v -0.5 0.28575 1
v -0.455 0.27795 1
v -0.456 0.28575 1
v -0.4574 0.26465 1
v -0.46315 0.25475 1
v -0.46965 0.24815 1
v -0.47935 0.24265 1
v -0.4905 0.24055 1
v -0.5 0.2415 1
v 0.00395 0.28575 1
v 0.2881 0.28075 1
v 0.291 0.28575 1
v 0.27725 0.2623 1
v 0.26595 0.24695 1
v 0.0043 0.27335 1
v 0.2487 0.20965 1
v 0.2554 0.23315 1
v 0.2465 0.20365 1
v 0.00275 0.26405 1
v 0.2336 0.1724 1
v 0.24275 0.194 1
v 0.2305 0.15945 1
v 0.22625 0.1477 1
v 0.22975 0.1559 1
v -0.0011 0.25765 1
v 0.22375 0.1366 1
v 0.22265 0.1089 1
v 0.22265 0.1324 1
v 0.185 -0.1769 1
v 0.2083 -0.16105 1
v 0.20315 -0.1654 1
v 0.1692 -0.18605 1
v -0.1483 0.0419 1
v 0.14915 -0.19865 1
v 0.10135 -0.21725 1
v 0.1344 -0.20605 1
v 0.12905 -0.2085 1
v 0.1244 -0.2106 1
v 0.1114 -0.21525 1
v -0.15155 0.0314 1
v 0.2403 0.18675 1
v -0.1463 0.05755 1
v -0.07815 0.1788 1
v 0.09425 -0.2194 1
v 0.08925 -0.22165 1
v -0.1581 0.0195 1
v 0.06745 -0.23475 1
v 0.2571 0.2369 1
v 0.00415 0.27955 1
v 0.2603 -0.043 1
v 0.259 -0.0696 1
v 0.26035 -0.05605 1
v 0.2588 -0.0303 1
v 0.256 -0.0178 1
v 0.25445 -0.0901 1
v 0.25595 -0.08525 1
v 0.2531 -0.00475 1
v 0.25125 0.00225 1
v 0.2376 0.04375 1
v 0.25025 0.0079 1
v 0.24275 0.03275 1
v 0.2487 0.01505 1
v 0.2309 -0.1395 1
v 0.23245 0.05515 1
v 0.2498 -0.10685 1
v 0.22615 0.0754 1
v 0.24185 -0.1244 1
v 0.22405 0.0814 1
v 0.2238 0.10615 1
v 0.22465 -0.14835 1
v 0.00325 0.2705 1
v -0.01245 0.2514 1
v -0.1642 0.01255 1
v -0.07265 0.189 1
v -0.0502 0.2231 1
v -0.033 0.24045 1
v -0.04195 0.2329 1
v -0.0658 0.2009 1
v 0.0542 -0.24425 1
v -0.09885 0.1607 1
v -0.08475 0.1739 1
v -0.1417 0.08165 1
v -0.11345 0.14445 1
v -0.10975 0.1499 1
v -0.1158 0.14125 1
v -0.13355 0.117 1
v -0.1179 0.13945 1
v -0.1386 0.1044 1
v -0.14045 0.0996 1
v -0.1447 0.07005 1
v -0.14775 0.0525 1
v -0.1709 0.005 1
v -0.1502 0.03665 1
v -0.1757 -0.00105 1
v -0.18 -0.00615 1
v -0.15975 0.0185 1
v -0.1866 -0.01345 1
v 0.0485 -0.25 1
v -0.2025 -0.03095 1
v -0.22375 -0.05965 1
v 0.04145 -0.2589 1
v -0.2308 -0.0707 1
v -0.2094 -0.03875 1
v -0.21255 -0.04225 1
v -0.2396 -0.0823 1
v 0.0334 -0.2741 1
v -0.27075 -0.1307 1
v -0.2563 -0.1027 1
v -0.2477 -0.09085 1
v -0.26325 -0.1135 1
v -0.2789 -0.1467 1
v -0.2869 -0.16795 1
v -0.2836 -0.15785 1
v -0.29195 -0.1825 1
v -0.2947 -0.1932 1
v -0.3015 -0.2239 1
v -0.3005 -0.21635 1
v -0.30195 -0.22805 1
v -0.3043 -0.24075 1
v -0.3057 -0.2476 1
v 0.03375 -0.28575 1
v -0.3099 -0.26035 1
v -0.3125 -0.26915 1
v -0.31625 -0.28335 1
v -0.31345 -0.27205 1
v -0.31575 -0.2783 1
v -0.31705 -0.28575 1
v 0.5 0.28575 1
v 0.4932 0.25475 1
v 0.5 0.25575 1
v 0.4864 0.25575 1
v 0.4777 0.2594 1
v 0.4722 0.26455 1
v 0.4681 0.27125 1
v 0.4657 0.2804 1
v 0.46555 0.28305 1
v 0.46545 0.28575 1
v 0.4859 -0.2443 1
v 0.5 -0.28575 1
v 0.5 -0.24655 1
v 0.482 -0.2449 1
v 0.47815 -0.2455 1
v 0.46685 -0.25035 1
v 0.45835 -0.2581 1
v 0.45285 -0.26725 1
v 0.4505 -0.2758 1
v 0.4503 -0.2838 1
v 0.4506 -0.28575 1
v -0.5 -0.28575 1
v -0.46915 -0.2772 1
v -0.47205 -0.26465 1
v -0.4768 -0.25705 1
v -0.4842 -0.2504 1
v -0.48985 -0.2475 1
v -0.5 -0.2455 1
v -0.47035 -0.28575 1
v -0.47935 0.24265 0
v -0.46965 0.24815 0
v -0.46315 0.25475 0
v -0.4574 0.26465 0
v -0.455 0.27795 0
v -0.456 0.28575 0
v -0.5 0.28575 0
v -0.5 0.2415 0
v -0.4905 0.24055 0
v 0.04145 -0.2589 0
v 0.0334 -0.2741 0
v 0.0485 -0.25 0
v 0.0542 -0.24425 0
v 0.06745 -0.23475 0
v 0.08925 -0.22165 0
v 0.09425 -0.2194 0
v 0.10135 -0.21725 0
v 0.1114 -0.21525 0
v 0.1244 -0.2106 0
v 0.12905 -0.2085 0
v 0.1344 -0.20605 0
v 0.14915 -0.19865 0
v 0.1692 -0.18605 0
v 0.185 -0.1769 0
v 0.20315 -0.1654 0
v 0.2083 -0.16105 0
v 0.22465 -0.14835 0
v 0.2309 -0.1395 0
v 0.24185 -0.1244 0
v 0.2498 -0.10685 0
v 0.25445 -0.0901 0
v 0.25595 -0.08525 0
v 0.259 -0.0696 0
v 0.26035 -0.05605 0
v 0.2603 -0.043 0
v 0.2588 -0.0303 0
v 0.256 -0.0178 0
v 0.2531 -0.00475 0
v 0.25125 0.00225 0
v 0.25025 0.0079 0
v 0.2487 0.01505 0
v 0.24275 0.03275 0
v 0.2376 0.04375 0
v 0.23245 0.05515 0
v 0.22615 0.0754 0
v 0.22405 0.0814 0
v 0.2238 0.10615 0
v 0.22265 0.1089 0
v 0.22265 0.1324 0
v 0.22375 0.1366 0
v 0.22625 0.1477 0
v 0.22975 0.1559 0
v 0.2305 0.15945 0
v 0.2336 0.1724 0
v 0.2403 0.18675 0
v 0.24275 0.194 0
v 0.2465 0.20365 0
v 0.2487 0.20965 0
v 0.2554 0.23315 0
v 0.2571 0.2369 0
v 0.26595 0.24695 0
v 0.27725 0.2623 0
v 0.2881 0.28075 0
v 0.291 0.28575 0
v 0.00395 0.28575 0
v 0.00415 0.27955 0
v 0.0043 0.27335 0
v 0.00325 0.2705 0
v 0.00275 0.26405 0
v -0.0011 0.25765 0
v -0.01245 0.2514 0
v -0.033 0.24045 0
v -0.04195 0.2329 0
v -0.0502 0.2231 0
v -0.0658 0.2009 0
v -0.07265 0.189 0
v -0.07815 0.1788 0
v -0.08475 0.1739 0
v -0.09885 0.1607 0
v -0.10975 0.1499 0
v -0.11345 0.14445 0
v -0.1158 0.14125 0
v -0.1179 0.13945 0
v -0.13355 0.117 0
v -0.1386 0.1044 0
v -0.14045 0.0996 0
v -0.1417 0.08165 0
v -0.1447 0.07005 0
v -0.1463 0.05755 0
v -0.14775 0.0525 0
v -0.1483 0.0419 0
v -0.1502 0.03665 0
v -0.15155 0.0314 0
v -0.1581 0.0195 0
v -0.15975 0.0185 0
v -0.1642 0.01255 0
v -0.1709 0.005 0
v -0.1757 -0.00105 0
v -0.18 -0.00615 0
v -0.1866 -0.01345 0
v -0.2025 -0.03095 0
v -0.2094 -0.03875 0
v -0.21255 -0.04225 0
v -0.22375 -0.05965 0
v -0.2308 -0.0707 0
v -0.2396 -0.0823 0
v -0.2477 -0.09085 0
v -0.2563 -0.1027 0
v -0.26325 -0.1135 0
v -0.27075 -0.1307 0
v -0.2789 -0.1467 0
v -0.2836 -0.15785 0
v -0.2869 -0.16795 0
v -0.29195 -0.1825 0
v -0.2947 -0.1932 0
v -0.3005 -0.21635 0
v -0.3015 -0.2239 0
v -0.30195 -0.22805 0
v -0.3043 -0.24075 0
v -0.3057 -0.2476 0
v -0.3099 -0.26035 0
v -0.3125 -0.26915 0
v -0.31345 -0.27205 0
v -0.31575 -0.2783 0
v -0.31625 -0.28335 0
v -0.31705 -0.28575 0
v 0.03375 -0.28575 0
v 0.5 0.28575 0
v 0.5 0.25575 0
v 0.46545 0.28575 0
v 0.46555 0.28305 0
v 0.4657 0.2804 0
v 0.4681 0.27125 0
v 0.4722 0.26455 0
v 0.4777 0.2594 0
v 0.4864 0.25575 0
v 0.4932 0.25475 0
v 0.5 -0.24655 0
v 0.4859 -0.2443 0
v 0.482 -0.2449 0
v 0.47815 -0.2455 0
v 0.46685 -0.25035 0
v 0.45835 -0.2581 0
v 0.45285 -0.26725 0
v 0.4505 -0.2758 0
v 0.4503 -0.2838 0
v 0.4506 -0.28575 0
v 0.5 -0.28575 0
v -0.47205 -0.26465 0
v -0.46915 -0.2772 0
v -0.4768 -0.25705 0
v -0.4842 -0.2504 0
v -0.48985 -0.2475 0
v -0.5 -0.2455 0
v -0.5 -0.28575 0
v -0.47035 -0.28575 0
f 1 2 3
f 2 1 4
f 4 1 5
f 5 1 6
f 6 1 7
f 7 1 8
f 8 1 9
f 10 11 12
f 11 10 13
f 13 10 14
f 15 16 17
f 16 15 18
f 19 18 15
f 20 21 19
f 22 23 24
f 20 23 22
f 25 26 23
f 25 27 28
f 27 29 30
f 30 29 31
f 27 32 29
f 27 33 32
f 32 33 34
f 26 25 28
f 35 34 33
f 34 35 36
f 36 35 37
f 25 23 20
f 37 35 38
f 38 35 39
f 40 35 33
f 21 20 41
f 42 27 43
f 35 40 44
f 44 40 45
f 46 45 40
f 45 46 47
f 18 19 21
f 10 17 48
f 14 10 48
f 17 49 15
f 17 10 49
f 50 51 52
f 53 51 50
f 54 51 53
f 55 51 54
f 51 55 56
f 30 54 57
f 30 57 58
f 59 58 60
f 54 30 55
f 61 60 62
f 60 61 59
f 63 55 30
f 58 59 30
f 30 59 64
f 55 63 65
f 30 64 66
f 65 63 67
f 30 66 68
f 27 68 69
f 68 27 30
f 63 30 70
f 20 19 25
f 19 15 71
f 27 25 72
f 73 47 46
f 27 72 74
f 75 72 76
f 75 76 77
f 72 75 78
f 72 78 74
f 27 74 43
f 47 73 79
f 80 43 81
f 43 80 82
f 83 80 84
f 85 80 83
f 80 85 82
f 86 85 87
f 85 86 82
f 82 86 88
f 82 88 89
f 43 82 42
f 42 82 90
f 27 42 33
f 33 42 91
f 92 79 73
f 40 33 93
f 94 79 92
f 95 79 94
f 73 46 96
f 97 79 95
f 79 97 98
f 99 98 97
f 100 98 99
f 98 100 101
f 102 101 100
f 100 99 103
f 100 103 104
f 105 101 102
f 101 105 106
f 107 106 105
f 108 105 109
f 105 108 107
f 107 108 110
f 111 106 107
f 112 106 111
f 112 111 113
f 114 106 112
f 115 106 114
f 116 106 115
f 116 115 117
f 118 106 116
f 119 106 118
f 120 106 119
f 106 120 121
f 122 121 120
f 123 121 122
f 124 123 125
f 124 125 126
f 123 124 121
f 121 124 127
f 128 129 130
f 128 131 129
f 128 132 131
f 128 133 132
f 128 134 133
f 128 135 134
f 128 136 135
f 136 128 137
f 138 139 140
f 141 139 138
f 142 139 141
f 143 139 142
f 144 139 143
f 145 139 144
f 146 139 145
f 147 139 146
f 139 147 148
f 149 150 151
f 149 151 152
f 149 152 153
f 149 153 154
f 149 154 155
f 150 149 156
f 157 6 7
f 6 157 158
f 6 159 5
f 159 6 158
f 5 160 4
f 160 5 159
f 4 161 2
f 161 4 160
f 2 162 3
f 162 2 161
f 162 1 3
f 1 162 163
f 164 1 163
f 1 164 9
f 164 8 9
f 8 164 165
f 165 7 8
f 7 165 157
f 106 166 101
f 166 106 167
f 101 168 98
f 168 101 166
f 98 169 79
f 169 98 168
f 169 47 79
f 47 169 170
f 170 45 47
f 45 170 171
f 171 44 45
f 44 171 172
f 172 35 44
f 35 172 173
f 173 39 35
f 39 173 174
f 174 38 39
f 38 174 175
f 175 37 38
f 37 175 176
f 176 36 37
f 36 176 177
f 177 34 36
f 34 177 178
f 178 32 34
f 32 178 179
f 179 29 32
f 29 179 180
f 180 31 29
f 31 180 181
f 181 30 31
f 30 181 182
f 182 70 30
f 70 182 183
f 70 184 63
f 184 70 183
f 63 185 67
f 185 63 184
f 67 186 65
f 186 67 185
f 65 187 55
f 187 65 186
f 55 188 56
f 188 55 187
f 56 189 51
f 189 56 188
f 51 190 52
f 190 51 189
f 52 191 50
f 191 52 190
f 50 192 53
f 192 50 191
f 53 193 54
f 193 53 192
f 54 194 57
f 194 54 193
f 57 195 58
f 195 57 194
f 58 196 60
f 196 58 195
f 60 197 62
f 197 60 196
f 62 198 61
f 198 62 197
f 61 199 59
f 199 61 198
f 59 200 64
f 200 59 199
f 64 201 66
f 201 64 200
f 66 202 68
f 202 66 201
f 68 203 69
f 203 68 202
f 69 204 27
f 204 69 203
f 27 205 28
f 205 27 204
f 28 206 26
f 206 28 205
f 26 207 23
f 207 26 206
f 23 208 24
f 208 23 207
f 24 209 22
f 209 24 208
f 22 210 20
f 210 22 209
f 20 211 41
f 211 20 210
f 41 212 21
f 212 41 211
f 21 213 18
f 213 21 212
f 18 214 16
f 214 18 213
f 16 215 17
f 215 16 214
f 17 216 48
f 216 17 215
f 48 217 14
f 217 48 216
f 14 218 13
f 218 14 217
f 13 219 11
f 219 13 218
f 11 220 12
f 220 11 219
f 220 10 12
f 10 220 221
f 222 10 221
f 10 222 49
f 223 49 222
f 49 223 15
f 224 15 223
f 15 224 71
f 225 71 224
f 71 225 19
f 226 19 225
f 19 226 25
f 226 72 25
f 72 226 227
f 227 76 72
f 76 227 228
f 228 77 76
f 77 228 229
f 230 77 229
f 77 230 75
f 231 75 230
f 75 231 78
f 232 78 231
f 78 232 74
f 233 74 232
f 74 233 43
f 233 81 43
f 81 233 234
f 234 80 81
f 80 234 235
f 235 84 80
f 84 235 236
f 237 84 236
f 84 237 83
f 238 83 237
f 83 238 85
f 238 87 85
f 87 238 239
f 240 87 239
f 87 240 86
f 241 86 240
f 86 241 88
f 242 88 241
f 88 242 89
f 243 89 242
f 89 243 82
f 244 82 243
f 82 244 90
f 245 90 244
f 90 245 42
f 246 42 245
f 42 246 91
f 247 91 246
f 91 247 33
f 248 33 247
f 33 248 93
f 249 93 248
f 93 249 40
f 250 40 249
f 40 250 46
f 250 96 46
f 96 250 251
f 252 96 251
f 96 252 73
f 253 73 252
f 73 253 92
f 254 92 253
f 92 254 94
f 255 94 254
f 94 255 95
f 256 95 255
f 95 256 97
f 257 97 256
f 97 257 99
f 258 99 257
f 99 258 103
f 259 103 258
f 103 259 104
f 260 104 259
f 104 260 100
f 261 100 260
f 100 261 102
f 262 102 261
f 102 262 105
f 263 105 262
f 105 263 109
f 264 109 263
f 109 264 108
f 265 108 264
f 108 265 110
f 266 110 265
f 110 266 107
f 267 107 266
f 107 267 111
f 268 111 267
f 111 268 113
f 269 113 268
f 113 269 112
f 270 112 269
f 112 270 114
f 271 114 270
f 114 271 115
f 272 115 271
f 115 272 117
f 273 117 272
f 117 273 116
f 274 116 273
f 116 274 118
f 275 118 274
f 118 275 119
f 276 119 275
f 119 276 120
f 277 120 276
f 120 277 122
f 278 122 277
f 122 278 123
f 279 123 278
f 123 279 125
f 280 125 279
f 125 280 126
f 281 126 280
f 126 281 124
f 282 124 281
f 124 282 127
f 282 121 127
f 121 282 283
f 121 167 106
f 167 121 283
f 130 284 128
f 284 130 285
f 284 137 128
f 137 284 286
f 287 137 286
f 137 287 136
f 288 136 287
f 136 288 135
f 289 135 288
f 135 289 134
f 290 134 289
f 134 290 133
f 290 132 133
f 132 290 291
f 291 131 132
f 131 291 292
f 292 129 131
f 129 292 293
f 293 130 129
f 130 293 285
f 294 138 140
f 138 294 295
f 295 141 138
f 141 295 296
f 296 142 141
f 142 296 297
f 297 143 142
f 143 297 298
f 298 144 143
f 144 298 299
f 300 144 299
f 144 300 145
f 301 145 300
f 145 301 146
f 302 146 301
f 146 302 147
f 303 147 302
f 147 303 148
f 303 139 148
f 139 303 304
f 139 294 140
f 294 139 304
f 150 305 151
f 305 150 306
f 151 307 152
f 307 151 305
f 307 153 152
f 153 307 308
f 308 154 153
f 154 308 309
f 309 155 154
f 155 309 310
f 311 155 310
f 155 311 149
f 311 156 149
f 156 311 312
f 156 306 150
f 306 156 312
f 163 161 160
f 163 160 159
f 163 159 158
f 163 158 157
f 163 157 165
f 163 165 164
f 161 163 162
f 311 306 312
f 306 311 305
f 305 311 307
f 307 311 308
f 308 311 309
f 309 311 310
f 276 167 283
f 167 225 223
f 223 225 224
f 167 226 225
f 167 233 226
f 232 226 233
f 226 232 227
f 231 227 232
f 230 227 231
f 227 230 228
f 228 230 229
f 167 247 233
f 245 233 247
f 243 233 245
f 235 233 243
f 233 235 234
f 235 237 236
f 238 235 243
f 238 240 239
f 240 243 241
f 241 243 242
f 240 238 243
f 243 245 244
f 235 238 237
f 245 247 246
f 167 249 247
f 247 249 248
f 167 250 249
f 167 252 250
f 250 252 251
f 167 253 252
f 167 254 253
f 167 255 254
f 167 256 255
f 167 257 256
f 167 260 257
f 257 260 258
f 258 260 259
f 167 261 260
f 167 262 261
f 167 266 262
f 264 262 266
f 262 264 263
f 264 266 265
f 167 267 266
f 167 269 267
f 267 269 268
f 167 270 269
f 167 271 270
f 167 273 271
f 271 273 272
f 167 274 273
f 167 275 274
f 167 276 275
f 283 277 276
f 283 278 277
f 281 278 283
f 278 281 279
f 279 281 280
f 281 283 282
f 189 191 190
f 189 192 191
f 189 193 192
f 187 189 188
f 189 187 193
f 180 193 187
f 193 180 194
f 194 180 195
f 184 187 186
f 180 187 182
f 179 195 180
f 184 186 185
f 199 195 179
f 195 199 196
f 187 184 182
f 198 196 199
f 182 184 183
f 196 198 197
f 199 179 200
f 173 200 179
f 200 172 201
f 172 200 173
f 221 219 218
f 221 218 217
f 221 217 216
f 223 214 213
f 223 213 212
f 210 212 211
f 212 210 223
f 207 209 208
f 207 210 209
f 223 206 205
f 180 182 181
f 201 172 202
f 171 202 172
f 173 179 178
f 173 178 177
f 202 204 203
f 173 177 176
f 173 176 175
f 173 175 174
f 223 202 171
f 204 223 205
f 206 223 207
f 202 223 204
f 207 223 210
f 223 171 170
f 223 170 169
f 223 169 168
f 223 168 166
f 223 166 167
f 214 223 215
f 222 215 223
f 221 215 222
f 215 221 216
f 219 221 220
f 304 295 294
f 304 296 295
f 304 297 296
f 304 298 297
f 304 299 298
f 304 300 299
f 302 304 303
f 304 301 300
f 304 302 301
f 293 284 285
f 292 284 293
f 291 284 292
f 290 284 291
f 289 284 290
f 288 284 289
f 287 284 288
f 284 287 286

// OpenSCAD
module card4orange_1()
{
 /* Generated by trace2scad version 20150415
    http://aggregate.org/MAKE/TRACE2SCAD/
    Optimized model has 158/1051 original points
 */
 color([0.5, 0.5, 0.5])
 assign(minx=0) /* polygon minx=0 */
 assign(miny=0) /* polygon miny=0 */
 assign(maxx=20000) /* polygon maxx=20000 */
 assign(maxy=11430) /* polygon maxy=11430 */
 assign(dx=maxx-minx)
 assign(dy=maxy-miny)
 assign(maxd=((dx>dy)?dx:dy))
 scale([1/maxd, 1/maxd, 1])
 translate([-minx-dx/2, -miny-dy/2, 0])
 linear_extrude(height=1, convexity=158)
 union() {
  union() {
   polygon([[0,10988],[0,10545],[190,10526],[413,10568],[607,10678],[737,10810],[852,11008],[900,11274],[880,11430],[0,11430]], convexity=5);
   polygon([[10083,11306],[10086,11182],[10065,11125],[10055,10996],[9978,10868],[9751,10743],[9340,10524],[9161,10373],[8996,10177],[8684,9733],[8547,9495],[8437,9291],[8305,9193],[8023,8929],[7805,8713],[7731,8604],[7684,8540],[7642,8504],[7329,8055],[7228,7803],[7191,7707],[7166,7348],[7106,7116],[7074,6866],[7045,6765],[7034,6553],[6996,6448],[6969,6343],[6838,6105],[6805,6085],[6716,5966],[6582,5815],[6486,5694],[6400,5592],[6268,5446],[5950,5096],[5812,4940],[5749,4870],[5525,4522],[5384,4301],[5208,4069],[5046,3898],[4874,3661],[4735,3445],[4585,3101],[4422,2781],[4328,2558],[4262,2356],[4161,2065],[4106,1851],[3990,1388],[3970,1237],[3961,1154],[3914,900],[3886,763],[3802,508],[3750,332],[3731,274],[3685,149],[3675,48],[3659,0],[10675,0],[10668,233],[10829,537],[10970,715],[11084,830],[11349,1020],[11785,1282],[11885,1327],[12027,1370],[12228,1410],[12488,1503],[12581,1545],[12688,1594],[12983,1742],[13384,1994],[13700,2177],[14063,2407],[14166,2494],[14493,2748],[14618,2925],[14837,3227],[14996,3578],[15089,3913],[15119,4010],[15180,4323],[15207,4594],[15206,4855],[15176,5109],[15120,5359],[15062,5620],[15025,5760],[15005,5873],[14974,6016],[14855,6370],[14752,6590],[14649,6818],[14523,7223],[14481,7343],[14476,7838],[14453,7893],[14453,8363],[14475,8447],[14525,8669],[14595,8833],[14610,8904],[14672,9163],[14806,9450],[14855,9595],[14930,9788],[14974,9908],[15108,10378],[15142,10453],[15319,10654],[15545,10961],[15762,11330],[15820,11430],[10079,11430]], convexity=10);
   polygon([[19311,11376],[19314,11323],[19362,11140],[19444,11006],[19554,10903],[19728,10830],[19864,10810],[20000,10830],[20000,11430],[19309,11430]], convexity=5);
   polygon([[19640,817],[19563,805],[19337,708],[19167,553],[19057,370],[19010,199],[19006,39],[19012,0],[20000,0],[20000,784],[19718,829]], convexity=6);
   polygon([[0,403],[0,0],[593,0],[617,171],[559,422],[464,574],[316,707],[203,765],[0,805]], convexity=5);
  }
 }
}

module card4orange()
{
 /* all layers combined, scaled to within a 1mm cube */
 scale([1, 1, 1/1])
 difference() {
  union() {
   scale([1,1,2]) translate([0,0,-0.5]) card4orange_1();
  }
  translate([0,0,-2]) cube([2,2,4],center=true);
 }
}
card4orange();
